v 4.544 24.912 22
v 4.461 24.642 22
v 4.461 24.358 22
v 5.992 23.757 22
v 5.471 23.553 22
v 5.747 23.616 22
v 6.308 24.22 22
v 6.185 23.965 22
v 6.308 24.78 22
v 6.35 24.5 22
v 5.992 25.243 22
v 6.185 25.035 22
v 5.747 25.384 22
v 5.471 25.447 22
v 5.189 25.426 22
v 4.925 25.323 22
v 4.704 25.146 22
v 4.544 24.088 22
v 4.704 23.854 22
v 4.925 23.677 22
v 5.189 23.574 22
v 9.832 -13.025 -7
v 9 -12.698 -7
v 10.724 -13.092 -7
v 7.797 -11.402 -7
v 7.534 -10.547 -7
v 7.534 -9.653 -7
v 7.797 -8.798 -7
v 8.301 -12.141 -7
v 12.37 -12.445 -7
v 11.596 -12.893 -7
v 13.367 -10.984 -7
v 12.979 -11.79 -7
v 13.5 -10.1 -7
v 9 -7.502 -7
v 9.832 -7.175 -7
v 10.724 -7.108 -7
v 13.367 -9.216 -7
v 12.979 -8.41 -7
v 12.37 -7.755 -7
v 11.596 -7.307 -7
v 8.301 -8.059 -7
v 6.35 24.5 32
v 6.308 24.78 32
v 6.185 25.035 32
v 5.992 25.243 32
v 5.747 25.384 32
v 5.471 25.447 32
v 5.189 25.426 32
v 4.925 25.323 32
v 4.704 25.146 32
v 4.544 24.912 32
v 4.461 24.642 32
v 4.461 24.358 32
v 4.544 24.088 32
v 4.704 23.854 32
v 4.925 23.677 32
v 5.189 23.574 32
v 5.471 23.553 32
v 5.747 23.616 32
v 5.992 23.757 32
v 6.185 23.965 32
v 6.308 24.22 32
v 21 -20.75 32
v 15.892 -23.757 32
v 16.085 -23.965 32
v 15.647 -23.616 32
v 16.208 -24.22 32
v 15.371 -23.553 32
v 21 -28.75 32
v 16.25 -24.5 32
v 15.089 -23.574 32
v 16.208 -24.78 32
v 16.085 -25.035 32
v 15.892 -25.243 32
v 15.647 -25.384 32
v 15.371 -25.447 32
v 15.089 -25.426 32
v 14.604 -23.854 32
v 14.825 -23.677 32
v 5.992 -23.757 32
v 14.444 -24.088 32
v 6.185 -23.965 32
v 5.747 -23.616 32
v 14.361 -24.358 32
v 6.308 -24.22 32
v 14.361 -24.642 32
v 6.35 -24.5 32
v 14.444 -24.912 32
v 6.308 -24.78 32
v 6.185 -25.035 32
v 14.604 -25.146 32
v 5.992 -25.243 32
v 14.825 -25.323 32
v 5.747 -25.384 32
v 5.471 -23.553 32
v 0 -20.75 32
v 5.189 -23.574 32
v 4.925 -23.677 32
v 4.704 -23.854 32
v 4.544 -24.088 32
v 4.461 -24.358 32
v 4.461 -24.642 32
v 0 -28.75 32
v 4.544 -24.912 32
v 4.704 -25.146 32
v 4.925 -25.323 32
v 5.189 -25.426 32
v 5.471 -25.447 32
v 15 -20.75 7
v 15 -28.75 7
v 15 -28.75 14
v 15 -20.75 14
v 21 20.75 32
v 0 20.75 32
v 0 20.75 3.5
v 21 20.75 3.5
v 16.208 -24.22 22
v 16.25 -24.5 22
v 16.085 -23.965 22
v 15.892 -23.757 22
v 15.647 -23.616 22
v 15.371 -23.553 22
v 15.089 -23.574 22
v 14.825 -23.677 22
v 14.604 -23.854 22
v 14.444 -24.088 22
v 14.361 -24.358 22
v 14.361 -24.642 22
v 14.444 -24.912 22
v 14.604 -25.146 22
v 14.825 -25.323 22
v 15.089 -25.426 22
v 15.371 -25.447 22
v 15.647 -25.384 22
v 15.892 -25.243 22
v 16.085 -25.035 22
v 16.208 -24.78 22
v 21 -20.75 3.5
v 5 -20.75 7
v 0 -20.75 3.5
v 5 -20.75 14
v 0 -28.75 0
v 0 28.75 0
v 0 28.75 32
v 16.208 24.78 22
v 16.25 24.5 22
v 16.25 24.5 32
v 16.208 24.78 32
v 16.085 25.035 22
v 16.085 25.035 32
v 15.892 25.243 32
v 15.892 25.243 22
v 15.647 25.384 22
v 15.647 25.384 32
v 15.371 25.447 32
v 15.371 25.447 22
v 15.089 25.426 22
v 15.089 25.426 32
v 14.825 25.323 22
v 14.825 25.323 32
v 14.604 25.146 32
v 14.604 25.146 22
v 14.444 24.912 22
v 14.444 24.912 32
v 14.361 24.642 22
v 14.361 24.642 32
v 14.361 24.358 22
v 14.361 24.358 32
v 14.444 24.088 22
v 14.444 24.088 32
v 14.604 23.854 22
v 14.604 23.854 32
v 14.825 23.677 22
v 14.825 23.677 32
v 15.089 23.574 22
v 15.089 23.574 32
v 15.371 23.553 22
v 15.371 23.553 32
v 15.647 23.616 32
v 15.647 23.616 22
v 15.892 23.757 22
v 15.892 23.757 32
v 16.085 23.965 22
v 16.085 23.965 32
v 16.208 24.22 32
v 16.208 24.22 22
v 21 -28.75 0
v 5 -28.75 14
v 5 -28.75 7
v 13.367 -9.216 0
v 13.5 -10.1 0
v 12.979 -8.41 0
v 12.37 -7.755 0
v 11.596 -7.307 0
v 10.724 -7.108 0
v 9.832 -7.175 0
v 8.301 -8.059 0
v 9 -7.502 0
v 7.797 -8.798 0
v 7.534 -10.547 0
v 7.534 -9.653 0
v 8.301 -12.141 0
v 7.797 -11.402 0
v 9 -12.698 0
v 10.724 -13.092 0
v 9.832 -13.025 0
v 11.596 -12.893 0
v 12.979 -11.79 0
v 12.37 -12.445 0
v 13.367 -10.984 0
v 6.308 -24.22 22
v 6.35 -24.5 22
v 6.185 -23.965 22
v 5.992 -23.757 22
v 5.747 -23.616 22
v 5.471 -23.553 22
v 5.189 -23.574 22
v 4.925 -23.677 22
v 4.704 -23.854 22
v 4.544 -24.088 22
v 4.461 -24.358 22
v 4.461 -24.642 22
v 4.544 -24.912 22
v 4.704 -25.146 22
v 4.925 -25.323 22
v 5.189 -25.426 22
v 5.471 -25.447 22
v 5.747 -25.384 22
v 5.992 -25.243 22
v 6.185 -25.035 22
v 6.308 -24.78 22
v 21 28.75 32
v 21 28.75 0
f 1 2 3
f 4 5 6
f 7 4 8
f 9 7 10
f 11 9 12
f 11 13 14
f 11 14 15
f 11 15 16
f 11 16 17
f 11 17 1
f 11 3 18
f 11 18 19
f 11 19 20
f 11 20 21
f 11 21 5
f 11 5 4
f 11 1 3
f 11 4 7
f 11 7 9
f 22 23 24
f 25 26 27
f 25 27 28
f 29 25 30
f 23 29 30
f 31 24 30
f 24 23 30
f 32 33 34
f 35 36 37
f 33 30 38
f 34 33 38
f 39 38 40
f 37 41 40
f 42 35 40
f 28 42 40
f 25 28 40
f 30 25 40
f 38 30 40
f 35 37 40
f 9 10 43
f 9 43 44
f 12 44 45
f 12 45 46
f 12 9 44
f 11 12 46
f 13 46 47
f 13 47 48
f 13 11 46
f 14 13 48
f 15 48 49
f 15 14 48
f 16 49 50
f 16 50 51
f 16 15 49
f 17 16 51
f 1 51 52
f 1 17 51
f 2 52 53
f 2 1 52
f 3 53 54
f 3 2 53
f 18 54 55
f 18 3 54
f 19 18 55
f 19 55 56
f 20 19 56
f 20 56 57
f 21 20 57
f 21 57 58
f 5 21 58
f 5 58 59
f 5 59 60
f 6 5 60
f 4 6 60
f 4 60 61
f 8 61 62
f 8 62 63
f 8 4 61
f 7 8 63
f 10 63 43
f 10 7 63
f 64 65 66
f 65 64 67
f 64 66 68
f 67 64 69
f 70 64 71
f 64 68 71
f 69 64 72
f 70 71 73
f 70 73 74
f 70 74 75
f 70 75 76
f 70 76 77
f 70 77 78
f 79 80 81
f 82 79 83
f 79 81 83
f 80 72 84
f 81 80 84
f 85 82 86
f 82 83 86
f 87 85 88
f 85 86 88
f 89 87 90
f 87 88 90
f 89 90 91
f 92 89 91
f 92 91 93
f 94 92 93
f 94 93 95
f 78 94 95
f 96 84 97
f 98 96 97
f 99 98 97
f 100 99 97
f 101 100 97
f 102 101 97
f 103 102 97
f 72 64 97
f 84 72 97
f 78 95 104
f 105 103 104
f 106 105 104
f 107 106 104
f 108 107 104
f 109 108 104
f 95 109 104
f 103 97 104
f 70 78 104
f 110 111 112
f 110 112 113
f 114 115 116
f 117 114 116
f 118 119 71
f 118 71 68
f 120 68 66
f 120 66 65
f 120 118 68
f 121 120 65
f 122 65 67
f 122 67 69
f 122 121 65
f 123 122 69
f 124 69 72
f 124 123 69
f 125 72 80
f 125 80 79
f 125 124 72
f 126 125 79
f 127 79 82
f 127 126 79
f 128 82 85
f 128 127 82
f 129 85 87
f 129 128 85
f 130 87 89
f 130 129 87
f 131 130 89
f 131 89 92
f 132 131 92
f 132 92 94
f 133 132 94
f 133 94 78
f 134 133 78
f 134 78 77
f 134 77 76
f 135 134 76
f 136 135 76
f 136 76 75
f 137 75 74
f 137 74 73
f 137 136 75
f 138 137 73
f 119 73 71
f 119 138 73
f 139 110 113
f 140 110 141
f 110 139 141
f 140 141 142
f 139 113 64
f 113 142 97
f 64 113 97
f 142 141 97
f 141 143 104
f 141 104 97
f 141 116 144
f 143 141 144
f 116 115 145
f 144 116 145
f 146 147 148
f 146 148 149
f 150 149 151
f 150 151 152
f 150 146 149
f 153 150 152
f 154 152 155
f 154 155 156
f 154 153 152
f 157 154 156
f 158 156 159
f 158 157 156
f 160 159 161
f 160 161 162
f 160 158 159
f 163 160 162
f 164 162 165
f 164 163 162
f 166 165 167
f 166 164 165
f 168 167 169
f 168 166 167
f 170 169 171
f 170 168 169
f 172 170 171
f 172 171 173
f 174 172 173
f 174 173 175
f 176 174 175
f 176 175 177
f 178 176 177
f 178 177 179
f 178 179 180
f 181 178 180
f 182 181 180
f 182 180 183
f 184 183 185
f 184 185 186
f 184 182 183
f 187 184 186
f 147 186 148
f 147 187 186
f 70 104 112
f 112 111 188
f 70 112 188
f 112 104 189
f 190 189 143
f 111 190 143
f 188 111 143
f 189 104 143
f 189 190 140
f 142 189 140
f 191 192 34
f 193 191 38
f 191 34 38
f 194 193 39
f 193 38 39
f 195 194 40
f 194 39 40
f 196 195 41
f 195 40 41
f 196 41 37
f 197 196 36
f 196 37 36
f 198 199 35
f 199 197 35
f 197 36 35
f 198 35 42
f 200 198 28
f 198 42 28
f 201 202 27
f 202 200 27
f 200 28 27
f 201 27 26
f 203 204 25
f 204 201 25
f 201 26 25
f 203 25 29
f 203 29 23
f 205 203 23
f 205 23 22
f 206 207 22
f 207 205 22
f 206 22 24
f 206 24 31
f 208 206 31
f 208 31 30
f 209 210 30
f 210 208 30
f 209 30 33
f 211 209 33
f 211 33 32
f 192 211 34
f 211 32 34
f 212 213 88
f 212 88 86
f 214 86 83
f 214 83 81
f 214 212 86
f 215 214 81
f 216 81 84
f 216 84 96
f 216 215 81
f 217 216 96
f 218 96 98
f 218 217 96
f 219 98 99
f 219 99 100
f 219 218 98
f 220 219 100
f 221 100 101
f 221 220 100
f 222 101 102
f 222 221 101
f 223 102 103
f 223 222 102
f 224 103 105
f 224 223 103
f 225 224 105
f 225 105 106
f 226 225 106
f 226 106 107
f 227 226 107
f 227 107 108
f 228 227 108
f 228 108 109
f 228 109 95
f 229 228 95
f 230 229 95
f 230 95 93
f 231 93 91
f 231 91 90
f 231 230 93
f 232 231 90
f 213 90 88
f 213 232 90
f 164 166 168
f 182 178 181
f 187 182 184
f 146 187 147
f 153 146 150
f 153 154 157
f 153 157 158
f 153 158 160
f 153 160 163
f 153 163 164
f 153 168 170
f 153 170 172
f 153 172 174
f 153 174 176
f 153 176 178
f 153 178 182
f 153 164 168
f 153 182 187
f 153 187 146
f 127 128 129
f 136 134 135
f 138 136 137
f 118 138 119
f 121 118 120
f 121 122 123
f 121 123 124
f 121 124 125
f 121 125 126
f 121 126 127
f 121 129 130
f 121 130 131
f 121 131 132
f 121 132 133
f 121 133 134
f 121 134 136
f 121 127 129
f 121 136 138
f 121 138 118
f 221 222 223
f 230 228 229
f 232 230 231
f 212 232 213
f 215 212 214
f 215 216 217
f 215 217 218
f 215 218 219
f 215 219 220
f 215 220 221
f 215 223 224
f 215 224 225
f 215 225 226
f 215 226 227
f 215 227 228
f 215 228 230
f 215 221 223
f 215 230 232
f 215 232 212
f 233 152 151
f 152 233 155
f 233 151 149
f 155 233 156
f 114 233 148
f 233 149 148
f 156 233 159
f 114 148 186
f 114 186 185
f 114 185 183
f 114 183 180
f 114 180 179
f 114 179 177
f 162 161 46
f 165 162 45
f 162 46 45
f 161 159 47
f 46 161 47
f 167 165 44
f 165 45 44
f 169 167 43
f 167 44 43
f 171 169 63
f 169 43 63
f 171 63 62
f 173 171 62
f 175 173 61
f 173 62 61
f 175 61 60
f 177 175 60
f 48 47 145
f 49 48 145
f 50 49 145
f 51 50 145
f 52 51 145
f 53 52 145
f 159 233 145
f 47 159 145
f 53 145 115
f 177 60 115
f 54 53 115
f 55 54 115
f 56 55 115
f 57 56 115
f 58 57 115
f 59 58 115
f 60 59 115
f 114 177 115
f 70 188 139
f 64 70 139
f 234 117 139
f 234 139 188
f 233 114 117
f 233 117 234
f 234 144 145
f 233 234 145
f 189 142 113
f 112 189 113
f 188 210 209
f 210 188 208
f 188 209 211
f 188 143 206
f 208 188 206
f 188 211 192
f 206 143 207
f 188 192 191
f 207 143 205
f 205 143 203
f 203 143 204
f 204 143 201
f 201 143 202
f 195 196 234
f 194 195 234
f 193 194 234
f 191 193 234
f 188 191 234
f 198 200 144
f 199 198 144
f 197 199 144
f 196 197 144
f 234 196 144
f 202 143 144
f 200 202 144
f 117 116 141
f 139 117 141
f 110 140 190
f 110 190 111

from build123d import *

# Parameters (mm, degrees)
CYLINDER015_R     = 0.95
CYLINDER015_DEPTH = 10
CYLINDER016_R     = 0.95
CYLINDER016_DEPTH = 10
CYLINDER013_R     = 0.95
CYLINDER013_DEPTH = 10
CYLINDER014_R     = 0.95
CYLINDER014_DEPTH = 10
BOX003_W          = 10
BOX003_H          = 10
BOX003_DEPTH      = 7
PAD003_DEPTH      = 21
CYLINDER012_R     = 3
CYLINDER012_DEPTH = 10


with BuildPart() as cylinder015:
    # Cylinder015 → Cylinder015 (new body)
    with BuildSketch(Plane(origin=(9.9, 0, 0), x_dir=(1, 0, 0), z_dir=(0, 0, 1))):
        Circle(CYLINDER015_R)
    extrude(amount=CYLINDER015_DEPTH)


with BuildPart() as tornillos007:
    # Cylinder016 → Cylinder016 (new body)
    with BuildSketch(Plane.XY):
        Circle(CYLINDER016_R)
    extrude(amount=CYLINDER016_DEPTH)

    # Fusion011: union Cylinder015
    add(cylinder015.part)


with BuildPart() as tornillos007_1:
    # Fusion011 placement: moved
    add(tornillos007.part.moved(Location((5, -24.5, 22))))


with BuildPart() as cylinder013:
    # Cylinder013 → Cylinder013 (new body)
    with BuildSketch(Plane(origin=(9.9, 0, 0), x_dir=(1, 0, 0), z_dir=(0, 0, 1))):
        Circle(CYLINDER013_R)
    extrude(amount=CYLINDER013_DEPTH)


with BuildPart() as fusion012:
    # Cylinder014 → Cylinder014 (new body)
    with BuildSketch(Plane.XY):
        Circle(CYLINDER014_R)
    extrude(amount=CYLINDER014_DEPTH)

    # Fusion010: union Cylinder013
    add(cylinder013.part)


with BuildPart() as fusion012_1:
    # Fusion010 placement: moved
    add(fusion012.part.moved(Location((5, 24.5, 22))))

    # Fusion012: union Tornillos007
    add(tornillos007_1.part)


with BuildPart() as fusion012_2:
    # Fusion012 placement: moved
    add(fusion012_1.part.moved(Location((0.4, 0, 0))))


with BuildPart() as cube003:
    # Box003 → Box003 (new body)
    with BuildSketch(Plane(origin=(5, -29, 7), x_dir=(1, 0, 0), z_dir=(0, 0, 1))):
        with Locations((5, 5)):
            Rectangle(BOX003_W, BOX003_H)
    extrude(amount=BOX003_DEPTH)


with BuildPart() as holder004:
    # Sketch003 → Pad003 (new body)
    with BuildSketch(Plane.YZ):
        Polygon((-28.75, 32), (-28.75, 0), (28.75, 0), (28.75, 32), (20.75, 32), (20.75, 3.5), (-20.75, 3.5), (-20.75, 32), align=None)
    extrude(amount=PAD003_DEPTH)

    # Cut006: cut Cube003
    add(cube003.part, mode=Mode.SUBTRACT)

    # Cut007: cut Fusion012
    add(fusion012_2.part, mode=Mode.SUBTRACT)


with BuildPart() as holderceje:
    # Cylinder012 → Cylinder012 (new body)
    with BuildSketch(Plane(origin=(10.5, -10.1, -7), x_dir=(1, 0, 0), z_dir=(0, 0, 1))):
        Circle(CYLINDER012_R)
    extrude(amount=CYLINDER012_DEPTH)

    # Fusion013: union Holder004
    add(holder004.part)


solid = holderceje.part
